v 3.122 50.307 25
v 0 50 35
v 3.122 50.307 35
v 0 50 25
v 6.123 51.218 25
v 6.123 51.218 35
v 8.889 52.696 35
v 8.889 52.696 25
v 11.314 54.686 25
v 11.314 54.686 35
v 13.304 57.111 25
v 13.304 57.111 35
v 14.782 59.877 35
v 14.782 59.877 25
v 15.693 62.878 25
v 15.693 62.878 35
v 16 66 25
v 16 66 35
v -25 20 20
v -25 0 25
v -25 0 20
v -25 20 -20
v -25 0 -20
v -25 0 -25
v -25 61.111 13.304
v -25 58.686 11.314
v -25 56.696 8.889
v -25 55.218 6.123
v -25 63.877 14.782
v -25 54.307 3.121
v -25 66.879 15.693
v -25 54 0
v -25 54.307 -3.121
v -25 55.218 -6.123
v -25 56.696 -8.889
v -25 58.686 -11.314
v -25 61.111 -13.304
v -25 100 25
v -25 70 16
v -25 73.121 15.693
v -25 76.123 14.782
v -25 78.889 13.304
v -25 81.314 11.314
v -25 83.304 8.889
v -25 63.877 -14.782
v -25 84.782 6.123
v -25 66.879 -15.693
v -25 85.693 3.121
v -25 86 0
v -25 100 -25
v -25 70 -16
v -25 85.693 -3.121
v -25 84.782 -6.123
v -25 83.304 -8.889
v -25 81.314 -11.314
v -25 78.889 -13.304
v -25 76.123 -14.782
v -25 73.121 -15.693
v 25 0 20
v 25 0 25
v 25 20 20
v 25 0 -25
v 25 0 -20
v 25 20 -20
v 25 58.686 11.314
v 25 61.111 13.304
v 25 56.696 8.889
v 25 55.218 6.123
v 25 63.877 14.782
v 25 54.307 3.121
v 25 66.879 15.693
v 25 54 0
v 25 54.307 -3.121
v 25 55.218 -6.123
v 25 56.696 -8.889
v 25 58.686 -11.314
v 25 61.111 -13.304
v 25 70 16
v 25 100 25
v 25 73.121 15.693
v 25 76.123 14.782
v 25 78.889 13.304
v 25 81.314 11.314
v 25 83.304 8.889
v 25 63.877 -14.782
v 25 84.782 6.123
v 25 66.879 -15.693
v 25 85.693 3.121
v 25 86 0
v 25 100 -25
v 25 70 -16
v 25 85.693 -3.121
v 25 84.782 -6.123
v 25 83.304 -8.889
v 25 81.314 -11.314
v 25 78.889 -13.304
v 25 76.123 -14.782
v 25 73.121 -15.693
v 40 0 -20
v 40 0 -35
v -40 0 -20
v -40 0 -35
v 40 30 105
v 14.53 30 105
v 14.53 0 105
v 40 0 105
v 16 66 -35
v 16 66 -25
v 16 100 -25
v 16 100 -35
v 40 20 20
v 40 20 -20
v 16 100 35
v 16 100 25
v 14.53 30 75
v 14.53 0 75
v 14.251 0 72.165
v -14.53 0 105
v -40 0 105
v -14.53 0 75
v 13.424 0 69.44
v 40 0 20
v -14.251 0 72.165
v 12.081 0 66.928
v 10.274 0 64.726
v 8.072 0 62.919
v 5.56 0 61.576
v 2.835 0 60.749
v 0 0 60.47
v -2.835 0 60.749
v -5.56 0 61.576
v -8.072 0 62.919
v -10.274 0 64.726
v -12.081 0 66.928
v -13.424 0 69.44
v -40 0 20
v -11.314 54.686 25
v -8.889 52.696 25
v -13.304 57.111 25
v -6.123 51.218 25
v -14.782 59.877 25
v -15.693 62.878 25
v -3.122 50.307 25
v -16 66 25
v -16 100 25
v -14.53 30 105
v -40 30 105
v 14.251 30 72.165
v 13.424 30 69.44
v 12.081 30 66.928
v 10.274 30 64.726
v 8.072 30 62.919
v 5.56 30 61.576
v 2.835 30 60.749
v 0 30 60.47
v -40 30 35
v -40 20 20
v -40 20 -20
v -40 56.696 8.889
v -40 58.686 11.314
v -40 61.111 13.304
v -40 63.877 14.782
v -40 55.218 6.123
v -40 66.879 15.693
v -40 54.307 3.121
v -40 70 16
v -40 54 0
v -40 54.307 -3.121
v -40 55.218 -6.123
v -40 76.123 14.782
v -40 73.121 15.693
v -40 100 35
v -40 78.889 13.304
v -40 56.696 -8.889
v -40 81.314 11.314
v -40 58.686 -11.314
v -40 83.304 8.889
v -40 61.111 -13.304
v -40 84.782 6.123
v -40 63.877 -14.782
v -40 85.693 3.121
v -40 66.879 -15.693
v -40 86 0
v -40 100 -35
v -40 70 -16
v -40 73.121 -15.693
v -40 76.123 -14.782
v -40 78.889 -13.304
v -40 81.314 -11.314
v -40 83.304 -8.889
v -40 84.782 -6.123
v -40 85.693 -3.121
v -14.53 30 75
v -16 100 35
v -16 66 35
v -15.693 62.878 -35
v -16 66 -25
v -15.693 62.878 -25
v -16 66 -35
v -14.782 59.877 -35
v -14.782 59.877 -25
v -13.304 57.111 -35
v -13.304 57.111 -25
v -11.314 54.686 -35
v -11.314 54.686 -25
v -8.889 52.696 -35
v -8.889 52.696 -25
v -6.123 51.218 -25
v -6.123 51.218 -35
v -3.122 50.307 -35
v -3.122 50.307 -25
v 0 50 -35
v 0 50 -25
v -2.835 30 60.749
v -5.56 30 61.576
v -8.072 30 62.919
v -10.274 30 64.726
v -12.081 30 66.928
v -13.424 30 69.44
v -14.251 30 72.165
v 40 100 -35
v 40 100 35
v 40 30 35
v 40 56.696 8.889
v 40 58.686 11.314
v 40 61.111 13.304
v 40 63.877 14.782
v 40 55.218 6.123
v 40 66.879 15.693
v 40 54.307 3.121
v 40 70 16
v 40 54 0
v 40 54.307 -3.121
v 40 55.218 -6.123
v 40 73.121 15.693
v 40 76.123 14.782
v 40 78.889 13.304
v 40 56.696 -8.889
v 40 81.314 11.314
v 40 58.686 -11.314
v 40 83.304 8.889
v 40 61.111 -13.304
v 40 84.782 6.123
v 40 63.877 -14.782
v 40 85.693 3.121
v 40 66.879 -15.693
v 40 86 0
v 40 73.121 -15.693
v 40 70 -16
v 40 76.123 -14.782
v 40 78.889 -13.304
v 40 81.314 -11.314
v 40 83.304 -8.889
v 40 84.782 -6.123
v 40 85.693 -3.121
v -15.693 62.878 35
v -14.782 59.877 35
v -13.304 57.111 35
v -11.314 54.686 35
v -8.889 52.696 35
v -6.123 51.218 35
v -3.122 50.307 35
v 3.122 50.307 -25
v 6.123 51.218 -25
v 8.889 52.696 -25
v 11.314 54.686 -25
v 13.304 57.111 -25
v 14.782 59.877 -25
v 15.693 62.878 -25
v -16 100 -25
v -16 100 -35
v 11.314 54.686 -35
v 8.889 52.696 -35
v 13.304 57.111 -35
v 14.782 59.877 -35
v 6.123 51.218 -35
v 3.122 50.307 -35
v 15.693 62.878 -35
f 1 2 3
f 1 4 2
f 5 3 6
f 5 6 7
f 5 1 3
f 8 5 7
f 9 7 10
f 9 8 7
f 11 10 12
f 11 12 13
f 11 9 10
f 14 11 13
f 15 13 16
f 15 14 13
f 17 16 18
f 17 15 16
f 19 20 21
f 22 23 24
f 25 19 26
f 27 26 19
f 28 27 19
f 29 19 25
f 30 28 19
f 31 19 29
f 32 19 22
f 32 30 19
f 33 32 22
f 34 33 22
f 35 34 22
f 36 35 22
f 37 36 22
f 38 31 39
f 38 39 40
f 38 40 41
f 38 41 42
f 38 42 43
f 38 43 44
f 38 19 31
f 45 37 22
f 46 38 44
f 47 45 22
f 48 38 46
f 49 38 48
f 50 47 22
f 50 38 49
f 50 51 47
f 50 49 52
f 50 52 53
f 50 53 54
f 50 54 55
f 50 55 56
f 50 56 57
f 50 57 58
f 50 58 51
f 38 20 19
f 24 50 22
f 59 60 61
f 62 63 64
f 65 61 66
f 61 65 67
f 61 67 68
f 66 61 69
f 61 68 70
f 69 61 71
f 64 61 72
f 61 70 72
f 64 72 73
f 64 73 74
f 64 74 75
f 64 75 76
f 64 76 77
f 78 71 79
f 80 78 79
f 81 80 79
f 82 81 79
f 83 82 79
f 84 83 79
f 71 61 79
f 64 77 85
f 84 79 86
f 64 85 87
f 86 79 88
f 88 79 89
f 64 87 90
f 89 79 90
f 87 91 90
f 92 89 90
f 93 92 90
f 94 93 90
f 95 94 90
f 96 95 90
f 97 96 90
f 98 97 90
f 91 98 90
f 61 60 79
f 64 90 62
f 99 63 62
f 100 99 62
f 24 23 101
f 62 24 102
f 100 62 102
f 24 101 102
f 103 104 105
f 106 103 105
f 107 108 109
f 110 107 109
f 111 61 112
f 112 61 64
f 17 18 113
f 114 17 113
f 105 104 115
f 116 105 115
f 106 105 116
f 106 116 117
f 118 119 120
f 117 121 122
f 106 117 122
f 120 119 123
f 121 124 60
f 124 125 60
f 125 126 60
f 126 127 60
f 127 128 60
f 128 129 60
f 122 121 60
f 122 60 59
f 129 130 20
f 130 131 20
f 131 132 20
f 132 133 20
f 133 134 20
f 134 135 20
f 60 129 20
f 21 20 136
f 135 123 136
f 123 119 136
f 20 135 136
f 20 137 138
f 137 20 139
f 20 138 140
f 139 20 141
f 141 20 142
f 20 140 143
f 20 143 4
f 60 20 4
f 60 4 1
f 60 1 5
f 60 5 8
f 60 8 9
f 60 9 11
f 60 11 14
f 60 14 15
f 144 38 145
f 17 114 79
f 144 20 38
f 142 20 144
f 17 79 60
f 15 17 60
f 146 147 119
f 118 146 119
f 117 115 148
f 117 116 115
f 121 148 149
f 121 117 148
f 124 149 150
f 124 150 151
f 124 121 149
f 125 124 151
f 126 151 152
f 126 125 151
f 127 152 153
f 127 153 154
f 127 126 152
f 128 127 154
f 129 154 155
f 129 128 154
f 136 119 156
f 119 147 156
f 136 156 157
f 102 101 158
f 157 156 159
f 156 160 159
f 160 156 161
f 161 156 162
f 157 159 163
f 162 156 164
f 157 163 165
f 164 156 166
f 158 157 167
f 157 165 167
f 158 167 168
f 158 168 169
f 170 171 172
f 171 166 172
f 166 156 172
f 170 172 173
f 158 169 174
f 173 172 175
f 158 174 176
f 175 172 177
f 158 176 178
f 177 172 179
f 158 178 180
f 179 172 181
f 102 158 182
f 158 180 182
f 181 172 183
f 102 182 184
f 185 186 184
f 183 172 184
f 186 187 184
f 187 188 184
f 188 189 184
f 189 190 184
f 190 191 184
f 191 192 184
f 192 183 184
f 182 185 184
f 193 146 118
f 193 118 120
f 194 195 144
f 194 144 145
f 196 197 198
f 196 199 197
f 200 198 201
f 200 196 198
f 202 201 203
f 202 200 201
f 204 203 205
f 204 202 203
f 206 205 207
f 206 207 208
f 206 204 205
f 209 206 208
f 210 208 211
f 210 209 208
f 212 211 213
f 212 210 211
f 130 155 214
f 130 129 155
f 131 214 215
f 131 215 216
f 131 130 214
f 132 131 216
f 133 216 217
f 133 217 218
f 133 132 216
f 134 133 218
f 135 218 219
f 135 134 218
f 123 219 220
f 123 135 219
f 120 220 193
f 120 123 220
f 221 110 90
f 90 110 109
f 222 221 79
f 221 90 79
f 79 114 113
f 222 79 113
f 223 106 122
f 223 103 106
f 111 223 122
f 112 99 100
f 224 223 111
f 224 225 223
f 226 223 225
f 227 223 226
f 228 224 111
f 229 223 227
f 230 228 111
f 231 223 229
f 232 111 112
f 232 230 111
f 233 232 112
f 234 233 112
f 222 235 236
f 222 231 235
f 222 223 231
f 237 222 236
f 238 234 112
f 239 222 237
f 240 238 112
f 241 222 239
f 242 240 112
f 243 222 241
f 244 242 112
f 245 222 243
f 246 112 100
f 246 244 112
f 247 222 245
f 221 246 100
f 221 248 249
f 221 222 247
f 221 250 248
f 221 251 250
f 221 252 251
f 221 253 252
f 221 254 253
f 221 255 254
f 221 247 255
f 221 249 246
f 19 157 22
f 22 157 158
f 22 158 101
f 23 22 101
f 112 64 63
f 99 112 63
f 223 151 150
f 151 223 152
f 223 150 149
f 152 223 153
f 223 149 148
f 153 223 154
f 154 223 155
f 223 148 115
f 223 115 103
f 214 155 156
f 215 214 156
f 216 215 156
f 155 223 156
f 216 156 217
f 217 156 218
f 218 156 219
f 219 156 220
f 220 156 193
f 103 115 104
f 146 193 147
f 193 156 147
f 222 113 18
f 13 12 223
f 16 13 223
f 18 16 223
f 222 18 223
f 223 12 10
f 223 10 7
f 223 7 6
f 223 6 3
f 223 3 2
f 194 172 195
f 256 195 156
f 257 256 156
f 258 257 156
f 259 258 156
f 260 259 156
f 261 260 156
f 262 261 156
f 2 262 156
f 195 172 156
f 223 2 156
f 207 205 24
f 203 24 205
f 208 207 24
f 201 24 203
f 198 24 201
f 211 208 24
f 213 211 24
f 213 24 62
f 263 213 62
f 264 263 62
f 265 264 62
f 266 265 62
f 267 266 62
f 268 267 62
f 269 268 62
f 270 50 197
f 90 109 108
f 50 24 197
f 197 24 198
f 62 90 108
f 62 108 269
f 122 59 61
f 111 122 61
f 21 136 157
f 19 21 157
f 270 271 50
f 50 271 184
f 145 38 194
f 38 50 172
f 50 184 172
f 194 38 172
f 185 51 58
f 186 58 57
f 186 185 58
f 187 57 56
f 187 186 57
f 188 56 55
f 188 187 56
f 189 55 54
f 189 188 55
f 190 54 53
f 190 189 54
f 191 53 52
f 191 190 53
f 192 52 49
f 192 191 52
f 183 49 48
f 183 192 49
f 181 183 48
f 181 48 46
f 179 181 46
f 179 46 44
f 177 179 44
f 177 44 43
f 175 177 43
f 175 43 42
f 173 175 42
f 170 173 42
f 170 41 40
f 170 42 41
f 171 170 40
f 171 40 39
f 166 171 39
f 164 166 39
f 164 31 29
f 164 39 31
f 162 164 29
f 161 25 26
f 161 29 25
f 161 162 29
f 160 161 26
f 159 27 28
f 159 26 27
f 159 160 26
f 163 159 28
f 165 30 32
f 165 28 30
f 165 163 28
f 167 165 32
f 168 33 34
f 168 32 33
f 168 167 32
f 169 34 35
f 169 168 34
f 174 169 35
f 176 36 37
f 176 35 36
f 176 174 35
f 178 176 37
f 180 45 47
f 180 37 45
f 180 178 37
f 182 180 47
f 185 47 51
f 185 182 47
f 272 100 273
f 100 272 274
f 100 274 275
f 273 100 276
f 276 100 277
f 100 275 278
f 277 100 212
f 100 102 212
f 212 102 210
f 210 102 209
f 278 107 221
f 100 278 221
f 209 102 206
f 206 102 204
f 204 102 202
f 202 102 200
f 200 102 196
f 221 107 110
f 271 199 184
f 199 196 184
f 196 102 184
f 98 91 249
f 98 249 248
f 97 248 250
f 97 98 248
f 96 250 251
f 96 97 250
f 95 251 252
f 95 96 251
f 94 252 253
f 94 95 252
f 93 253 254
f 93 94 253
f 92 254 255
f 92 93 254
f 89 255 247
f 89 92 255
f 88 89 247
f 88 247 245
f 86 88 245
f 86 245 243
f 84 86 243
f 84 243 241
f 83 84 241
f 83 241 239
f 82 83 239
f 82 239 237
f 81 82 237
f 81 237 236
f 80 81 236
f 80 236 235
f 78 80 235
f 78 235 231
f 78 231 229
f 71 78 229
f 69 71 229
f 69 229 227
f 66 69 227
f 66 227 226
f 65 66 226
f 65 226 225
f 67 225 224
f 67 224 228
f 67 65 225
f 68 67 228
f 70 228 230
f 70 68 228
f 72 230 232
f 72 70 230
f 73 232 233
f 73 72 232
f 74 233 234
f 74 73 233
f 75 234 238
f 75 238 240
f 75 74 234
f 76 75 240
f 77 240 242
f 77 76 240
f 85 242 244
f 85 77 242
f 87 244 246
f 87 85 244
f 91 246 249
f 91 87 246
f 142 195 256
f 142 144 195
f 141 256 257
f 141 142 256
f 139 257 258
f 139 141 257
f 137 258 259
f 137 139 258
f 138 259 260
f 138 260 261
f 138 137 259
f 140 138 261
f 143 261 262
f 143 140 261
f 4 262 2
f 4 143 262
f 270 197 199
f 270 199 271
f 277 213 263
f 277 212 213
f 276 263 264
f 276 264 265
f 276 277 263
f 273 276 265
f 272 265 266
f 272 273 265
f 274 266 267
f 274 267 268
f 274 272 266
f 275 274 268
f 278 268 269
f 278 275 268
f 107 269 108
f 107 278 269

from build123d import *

# Parameters (mm, degrees)
BOSS_EXTRUDE1_DEPTH      = 40
BOSS_EXTRUDE1_DEPTH_BACK = 40
SKETCH1_R                = 16
SKETCH2_W                = 50
SKETCH2_H                = 50
CUT_EXTRUDE1_DEPTH       = 151.416089565
SKETCH3_W                = 32
SKETCH3_H                = 50
CUT_EXTRUDE2_DEPTH       = 129.452325787
FILLET1_R                = 16
SKETCH4_W                = 29.06
SKETCH4_H                = 44.53
CUT_EXTRUDE3_DEPTH       = 133.382022949
FILLET2_R                = 14.53


with BuildPart() as part:
    # Sketch1 → Boss-Extrude1 (new, two sides: drawn at the far end of the back side and taken through both)
    with BuildSketch(Plane(origin=(0, 0, 0), x_dir=(0, 0, -1), z_dir=(1, 0, 0)).offset(-BOSS_EXTRUDE1_DEPTH_BACK)):
        Polygon((-105, 0), (-20, 0), (-20, 20), (20, 20), (20, 0), (35, 0), (35, 100), (-35, 100), (-35, 30), (-105, 30), align=None)
        with Locations((0, 70)):
            Circle(SKETCH1_R, mode=Mode.SUBTRACT)
    extrude(amount=BOSS_EXTRUDE1_DEPTH + BOSS_EXTRUDE1_DEPTH_BACK)

    # Sketch2 → Cut-Extrude1 (cut, through all)
    with BuildSketch(Plane(origin=(0, 100, 0), x_dir=(1, 0, 0), z_dir=(0, 1, 0))):
        Rectangle(SKETCH2_W, SKETCH2_H)
    extrude(amount=-CUT_EXTRUDE1_DEPTH, mode=Mode.SUBTRACT)

    # Sketch3 → Cut-Extrude2 (cut, through all)
    with BuildSketch(Plane.XY.offset(35)):
        with Locations((0, 75)):
            Rectangle(SKETCH3_W, SKETCH3_H)
    extrude(amount=-CUT_EXTRUDE2_DEPTH, mode=Mode.SUBTRACT)

    # Fillet1
    fillet1_edges = [part.edges().sort_by_distance(p)[0] for p in [
        (-16, 50, -30),
        (16, 50, -30),
        (16, 50, 30),
        (-16, 50, 30),
    ]]
    fillet(fillet1_edges, radius=FILLET1_R - 0.0001)  # a hair under: the kernel refuses the full size

    # Sketch4 → Cut-Extrude3 (cut, through all)
    with BuildSketch(Plane(origin=(0, 30, 0), x_dir=(1, 0, 0), z_dir=(0, 1, 0))):
        with Locations((0, -82.735)):
            Rectangle(SKETCH4_W, SKETCH4_H)
    extrude(amount=-CUT_EXTRUDE3_DEPTH, mode=Mode.SUBTRACT)

    # Fillet2
    fillet2_edges = [part.edges().sort_by_distance(p)[0] for p in [
        (14.53, 15, 60.47),
        (-14.53, 15, 60.47),
    ]]
    fillet(fillet2_edges, radius=FILLET2_R - 0.0001)  # a hair under: the kernel refuses the full size


solid = part.part
